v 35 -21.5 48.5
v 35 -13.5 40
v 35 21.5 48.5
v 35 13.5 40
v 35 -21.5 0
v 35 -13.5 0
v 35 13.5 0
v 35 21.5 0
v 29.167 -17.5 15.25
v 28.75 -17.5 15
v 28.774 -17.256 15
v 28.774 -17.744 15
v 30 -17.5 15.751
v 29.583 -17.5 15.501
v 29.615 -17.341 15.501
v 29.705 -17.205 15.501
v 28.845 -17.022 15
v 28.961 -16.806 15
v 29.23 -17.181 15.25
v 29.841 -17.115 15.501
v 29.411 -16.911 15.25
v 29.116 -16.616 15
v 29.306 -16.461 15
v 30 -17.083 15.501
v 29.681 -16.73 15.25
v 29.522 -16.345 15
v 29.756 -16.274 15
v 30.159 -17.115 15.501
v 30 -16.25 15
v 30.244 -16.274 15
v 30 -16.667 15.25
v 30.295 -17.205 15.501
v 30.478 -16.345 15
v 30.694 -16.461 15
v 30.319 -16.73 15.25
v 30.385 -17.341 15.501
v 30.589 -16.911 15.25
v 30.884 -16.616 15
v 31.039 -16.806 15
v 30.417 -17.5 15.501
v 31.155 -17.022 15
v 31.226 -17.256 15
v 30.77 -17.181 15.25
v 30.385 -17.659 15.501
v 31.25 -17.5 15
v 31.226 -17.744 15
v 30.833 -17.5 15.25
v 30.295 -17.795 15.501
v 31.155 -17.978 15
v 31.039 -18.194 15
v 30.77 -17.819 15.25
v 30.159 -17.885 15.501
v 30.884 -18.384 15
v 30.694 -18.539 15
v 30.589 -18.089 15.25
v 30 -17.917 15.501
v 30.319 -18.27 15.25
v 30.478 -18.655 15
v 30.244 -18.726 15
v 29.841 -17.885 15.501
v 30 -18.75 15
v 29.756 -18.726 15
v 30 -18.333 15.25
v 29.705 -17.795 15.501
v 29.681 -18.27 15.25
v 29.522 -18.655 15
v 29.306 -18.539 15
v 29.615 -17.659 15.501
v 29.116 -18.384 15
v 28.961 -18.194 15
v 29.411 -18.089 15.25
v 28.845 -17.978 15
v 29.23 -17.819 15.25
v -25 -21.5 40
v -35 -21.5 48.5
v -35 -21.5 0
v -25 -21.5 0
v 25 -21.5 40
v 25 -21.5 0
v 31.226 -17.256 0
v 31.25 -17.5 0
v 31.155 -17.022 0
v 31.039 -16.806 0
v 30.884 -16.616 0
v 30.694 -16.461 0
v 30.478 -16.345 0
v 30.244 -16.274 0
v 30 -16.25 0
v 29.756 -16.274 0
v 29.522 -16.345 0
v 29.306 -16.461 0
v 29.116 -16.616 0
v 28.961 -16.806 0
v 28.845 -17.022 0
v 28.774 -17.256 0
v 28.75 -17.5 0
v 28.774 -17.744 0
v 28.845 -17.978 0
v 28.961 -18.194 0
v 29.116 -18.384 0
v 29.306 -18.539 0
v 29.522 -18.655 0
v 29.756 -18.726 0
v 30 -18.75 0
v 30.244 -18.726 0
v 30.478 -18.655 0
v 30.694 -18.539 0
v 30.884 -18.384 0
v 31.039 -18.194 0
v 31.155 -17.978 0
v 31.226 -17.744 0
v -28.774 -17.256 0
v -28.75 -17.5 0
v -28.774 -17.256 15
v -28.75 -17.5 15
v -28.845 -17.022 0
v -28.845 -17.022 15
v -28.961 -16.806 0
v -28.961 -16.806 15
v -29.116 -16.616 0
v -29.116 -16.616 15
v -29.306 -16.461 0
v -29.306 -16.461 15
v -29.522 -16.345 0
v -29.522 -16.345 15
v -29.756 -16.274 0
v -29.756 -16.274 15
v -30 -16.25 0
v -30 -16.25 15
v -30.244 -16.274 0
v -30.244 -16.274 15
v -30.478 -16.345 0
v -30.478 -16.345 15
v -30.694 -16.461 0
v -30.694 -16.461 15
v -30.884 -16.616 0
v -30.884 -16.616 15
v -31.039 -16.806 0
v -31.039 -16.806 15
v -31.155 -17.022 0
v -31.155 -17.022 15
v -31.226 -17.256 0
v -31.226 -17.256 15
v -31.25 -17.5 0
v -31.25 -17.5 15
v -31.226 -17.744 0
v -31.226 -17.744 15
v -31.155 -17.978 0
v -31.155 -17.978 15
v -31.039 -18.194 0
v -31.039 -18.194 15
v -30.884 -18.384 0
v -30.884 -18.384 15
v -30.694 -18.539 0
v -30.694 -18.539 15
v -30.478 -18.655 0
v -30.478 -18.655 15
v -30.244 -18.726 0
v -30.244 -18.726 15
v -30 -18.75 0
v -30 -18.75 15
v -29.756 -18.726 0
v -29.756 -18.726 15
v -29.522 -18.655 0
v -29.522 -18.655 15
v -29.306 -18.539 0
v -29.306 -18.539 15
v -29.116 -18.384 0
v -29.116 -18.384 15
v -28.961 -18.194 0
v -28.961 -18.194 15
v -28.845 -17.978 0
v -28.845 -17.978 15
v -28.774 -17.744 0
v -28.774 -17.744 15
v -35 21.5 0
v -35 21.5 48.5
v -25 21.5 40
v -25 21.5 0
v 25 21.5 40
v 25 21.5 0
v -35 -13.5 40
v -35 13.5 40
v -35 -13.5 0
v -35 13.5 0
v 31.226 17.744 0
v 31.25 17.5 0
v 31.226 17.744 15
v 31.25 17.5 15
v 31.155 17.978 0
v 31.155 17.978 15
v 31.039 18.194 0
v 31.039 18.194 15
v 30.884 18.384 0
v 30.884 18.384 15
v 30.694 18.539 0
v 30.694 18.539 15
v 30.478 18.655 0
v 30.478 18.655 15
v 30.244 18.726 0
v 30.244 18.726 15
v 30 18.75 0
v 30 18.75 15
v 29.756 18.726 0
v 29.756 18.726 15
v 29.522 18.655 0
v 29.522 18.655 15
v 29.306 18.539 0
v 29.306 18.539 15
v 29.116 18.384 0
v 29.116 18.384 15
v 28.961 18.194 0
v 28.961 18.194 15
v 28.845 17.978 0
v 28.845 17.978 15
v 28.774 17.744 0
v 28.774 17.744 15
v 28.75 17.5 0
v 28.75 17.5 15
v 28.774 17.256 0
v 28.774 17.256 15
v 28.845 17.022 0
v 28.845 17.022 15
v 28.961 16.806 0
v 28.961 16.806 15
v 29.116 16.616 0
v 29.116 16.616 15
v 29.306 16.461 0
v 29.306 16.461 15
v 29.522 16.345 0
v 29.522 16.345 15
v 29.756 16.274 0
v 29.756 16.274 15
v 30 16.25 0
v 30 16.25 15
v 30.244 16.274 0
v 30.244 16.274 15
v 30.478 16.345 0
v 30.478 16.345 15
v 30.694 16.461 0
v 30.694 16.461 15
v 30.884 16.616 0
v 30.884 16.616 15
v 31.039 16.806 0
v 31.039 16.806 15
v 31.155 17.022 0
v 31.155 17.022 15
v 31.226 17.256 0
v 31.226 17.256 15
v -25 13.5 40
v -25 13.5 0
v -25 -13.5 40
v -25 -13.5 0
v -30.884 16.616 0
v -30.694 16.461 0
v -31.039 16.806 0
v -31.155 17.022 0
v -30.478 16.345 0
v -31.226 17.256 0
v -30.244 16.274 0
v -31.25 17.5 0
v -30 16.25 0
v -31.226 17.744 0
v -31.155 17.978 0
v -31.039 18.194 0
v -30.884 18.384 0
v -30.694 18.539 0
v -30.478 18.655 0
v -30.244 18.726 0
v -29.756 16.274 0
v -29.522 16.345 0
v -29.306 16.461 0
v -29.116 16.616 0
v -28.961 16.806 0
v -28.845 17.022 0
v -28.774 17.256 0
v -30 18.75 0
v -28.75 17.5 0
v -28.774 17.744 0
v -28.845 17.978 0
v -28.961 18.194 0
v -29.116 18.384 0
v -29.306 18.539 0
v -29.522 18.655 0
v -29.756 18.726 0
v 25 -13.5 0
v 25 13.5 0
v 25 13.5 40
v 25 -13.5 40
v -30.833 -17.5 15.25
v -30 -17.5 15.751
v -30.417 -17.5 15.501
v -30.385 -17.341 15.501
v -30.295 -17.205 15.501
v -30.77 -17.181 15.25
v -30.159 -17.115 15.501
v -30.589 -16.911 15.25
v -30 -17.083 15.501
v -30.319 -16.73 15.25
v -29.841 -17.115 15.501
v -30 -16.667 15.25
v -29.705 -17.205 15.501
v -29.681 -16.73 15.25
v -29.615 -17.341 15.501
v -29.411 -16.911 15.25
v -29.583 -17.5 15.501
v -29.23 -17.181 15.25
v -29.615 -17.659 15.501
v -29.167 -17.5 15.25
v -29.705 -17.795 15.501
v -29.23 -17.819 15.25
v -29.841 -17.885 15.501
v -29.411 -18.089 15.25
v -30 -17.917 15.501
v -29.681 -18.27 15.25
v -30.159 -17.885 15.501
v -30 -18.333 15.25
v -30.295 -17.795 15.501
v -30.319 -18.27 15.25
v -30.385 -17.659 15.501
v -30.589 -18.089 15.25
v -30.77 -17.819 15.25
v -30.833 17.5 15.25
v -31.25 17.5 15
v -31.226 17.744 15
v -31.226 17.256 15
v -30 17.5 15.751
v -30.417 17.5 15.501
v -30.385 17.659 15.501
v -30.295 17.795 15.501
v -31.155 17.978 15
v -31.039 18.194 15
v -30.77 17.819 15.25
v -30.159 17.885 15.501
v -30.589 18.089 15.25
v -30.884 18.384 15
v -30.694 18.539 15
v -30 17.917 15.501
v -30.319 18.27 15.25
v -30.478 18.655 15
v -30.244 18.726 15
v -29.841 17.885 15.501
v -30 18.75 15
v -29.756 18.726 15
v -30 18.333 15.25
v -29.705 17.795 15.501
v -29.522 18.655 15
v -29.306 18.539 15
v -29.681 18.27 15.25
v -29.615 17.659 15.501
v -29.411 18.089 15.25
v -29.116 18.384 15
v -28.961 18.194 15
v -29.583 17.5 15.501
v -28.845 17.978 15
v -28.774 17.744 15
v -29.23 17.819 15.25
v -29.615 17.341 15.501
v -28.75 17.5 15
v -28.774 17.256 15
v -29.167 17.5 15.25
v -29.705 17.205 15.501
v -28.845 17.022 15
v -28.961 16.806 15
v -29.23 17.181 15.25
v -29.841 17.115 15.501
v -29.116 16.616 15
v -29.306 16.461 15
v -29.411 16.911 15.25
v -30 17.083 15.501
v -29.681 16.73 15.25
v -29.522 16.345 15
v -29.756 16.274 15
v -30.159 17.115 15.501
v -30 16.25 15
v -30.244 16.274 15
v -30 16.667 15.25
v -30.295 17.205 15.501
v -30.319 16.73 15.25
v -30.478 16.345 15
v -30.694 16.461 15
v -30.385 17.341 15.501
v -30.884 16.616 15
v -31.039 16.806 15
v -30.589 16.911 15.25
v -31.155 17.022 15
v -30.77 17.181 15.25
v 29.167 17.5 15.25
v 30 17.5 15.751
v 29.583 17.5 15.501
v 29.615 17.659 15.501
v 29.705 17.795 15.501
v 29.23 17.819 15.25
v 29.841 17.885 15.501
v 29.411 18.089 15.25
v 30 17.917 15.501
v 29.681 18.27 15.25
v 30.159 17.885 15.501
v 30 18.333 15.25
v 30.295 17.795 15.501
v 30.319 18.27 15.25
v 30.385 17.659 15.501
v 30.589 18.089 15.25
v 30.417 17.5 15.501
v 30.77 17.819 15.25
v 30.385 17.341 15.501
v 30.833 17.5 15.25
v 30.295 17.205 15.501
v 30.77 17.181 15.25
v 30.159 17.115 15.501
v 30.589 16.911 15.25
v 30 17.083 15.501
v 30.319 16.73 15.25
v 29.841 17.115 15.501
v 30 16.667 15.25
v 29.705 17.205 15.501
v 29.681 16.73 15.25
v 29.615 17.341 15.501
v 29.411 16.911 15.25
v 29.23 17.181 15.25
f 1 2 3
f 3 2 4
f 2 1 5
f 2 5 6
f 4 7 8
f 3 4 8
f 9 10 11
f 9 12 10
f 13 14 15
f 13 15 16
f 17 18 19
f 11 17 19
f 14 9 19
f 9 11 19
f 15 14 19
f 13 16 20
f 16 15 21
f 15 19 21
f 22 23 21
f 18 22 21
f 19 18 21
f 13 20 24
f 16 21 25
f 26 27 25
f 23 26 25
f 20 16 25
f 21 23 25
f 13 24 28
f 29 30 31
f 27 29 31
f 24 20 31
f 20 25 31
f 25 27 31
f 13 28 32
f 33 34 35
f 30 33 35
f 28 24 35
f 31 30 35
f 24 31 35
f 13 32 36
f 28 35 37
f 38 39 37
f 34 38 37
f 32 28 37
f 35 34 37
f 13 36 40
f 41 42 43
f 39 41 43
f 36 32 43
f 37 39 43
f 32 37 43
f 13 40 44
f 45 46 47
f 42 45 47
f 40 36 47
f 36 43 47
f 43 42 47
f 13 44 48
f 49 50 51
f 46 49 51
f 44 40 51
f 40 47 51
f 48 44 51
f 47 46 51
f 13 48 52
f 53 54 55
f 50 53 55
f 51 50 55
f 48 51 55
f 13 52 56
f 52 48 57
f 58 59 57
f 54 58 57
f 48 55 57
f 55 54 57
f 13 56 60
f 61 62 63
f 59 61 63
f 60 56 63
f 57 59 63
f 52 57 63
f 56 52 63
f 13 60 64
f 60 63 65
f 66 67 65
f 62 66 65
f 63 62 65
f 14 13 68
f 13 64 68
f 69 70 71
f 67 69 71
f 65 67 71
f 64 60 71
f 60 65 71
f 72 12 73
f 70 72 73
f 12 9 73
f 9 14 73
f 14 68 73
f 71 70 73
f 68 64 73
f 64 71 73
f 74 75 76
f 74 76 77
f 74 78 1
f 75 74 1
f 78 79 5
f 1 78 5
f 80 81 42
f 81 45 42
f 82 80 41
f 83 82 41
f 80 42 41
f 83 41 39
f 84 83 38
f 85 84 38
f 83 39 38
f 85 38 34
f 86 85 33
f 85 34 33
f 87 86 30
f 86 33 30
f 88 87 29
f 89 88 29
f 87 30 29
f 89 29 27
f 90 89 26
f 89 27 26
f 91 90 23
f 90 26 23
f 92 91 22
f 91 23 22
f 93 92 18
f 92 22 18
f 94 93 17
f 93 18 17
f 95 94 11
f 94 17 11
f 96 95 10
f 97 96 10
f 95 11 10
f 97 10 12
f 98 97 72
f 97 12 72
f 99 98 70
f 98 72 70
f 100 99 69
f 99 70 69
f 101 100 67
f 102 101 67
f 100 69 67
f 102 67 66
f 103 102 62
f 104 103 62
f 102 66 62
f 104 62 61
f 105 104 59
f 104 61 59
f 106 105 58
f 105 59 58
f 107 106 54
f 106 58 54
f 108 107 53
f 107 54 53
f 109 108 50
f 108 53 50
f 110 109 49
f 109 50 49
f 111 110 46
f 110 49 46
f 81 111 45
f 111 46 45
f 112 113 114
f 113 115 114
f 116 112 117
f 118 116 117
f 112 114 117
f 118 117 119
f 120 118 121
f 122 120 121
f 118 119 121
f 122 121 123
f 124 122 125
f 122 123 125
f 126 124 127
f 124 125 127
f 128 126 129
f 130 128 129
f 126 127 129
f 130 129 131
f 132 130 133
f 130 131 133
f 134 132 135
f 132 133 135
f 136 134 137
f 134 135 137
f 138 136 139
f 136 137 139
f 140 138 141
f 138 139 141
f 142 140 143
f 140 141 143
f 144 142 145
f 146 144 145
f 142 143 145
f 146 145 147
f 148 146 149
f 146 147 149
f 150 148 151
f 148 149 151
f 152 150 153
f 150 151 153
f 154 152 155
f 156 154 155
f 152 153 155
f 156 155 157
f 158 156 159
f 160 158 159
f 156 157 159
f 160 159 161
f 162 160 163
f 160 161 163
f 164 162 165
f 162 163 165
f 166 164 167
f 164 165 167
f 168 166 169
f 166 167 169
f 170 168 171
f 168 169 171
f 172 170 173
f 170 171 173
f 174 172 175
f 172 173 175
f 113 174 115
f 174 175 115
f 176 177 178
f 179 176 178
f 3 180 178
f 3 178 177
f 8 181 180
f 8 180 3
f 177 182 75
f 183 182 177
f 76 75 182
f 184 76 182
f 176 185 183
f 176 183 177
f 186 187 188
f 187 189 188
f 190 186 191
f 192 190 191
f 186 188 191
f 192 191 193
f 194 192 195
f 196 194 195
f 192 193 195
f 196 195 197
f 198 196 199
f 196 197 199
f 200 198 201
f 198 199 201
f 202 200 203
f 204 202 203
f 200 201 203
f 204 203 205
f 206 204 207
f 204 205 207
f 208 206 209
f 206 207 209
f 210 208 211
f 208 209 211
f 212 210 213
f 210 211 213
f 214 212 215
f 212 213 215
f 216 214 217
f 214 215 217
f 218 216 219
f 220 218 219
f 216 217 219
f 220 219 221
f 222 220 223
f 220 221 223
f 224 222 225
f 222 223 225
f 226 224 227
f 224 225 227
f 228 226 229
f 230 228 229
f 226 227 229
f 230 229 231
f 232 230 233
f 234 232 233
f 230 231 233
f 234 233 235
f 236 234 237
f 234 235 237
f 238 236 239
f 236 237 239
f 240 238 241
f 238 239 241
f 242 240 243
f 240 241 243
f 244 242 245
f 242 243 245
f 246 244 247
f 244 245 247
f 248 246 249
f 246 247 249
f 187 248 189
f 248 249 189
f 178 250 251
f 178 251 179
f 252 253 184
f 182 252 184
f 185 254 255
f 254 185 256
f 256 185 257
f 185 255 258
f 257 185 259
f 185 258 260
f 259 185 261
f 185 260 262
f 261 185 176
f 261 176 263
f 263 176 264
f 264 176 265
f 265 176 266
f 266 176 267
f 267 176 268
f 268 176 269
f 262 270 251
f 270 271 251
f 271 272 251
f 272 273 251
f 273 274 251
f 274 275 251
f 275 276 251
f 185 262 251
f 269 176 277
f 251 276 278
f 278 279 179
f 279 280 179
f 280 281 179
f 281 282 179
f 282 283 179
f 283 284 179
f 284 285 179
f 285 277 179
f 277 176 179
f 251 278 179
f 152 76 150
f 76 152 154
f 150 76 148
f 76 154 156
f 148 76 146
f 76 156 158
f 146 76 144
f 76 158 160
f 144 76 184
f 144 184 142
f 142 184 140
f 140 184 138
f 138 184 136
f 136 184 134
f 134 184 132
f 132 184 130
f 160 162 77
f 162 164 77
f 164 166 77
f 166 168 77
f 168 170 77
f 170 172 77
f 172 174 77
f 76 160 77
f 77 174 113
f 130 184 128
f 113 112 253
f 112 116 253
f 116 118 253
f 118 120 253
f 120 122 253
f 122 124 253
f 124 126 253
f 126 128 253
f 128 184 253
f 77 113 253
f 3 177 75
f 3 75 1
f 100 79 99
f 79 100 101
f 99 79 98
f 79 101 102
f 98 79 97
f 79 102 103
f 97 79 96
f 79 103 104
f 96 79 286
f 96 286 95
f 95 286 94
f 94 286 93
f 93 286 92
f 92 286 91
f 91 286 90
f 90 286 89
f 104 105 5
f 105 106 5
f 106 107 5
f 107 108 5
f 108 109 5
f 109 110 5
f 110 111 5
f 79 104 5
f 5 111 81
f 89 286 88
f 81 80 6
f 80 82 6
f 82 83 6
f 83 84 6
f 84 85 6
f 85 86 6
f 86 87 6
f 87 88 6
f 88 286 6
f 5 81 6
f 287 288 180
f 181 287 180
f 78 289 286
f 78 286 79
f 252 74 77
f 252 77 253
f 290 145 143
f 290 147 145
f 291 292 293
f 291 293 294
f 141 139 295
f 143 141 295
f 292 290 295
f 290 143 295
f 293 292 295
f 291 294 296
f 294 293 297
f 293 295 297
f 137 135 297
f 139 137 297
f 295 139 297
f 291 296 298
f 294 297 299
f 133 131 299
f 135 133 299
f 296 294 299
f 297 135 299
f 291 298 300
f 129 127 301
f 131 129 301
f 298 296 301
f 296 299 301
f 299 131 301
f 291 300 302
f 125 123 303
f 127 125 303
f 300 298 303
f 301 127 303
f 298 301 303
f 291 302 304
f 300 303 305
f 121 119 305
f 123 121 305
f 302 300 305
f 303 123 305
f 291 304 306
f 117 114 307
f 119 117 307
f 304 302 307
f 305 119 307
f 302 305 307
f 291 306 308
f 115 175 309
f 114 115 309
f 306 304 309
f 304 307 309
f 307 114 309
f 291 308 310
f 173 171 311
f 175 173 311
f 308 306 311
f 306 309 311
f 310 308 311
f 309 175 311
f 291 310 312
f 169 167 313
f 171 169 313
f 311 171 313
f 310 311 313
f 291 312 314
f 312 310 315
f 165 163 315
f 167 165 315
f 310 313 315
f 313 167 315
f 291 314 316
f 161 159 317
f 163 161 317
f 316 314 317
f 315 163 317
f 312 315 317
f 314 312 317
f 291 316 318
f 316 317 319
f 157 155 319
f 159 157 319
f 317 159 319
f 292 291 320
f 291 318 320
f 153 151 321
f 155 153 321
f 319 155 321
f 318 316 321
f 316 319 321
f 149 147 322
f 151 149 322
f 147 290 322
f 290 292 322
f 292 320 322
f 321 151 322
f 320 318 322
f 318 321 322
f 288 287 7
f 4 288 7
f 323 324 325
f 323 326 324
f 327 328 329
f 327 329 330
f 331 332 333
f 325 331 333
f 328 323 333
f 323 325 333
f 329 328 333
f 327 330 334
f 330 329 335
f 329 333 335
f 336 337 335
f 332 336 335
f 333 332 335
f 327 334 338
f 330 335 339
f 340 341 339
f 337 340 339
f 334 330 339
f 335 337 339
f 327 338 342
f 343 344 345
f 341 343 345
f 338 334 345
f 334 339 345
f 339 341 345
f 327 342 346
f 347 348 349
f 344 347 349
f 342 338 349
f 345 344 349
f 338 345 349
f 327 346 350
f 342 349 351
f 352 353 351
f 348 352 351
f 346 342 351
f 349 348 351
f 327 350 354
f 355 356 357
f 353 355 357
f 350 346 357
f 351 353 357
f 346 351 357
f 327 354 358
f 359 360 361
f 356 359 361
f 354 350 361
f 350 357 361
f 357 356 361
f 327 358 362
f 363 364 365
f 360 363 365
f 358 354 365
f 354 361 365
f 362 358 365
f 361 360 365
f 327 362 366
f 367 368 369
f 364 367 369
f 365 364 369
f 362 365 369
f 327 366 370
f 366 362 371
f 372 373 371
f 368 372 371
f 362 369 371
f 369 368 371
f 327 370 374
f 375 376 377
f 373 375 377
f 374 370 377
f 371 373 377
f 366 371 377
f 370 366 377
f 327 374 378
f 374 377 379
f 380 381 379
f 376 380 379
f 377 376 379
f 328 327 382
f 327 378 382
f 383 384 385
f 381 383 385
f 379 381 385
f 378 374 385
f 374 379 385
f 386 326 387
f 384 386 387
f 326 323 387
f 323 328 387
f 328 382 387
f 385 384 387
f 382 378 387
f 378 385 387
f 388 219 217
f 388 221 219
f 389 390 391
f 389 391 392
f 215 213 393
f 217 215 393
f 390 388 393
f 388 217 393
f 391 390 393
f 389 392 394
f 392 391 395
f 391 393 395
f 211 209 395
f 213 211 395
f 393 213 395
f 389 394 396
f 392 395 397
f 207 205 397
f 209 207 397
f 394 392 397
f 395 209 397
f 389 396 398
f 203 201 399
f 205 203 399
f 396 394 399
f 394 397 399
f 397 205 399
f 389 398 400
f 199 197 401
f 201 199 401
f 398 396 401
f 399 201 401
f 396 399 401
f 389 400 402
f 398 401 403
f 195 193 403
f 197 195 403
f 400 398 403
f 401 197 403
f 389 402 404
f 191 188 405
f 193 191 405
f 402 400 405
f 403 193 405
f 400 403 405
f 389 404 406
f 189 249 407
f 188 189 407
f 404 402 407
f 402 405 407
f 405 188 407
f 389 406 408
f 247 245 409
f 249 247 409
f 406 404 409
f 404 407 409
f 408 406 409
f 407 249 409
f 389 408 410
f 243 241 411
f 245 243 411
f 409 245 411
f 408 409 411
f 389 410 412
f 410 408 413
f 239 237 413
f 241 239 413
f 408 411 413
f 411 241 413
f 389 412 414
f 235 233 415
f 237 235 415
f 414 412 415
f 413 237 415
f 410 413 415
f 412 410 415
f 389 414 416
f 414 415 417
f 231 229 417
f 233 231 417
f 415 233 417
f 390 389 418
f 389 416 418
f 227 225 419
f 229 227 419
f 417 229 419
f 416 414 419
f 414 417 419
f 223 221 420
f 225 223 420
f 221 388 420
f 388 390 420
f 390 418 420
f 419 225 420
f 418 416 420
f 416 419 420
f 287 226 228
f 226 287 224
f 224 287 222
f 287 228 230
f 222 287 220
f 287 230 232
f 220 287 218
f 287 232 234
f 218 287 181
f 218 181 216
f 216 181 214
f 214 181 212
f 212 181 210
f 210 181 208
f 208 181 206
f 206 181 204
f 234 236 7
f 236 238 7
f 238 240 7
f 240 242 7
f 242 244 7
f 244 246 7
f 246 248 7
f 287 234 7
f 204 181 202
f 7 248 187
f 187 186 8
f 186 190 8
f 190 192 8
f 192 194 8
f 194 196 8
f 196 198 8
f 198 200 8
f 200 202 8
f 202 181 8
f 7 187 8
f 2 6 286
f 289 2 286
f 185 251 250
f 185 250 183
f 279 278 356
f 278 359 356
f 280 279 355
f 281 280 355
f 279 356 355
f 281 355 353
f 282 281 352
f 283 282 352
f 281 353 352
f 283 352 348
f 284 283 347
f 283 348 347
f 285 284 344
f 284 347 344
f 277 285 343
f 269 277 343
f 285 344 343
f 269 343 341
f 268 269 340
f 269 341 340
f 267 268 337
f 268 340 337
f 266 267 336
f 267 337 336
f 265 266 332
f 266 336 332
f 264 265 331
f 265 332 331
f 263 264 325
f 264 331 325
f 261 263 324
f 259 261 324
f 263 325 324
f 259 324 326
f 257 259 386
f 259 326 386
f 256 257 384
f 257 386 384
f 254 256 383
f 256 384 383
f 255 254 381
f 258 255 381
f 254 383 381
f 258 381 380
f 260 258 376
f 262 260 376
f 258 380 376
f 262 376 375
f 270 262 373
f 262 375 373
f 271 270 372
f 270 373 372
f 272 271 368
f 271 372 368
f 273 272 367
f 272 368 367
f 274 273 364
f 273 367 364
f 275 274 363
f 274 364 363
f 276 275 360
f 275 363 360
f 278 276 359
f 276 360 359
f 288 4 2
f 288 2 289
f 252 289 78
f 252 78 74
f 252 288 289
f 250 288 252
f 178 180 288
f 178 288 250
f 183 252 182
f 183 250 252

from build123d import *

# Parameters (mm, degrees)
SKETCH_1_W             = 70
SKETCH_1_H             = 43
EXTRUDE_1_DEPTH        = 48.5
SKETCH_2_W             = 50
SKETCH_2_H             = 27
SKETCH_2_H_2           = 8
SKETCH_2_W_2           = 10
CUT_EXTRUDE_1_DEPTH    = 40
HOLE_WIZARD_M3_1_D     = 2.5
HOLE_WIZARD_M3_1_DEPTH = 15
HOLE_WIZARD_M3_1_TIP   = 0.751075774


with BuildPart() as part:
    # 草图1 → 凸台-拉伸1 (new body)
    with BuildSketch(Plane.XY):
        Rectangle(SKETCH_1_W, SKETCH_1_H)
    extrude(amount=EXTRUDE_1_DEPTH)

    # 草图2 → 切除-拉伸1 (cut)
    with BuildSketch(Plane(origin=(0, 0, 0), x_dir=(-1, 0, 0), z_dir=(0, 0, -1))):
        Rectangle(SKETCH_2_W, SKETCH_2_H)
        with Locations((0, -17.5)):
            Rectangle(SKETCH_2_W, SKETCH_2_H_2)
        with Locations((-30, 0)):
            Rectangle(SKETCH_2_W_2, SKETCH_2_H)
        with Locations((0, 17.5)):
            Rectangle(SKETCH_2_W, SKETCH_2_H_2)
        with Locations((30, 0)):
            Rectangle(SKETCH_2_W_2, SKETCH_2_H)
    extrude(amount=-CUT_EXTRUDE_1_DEPTH, mode=Mode.SUBTRACT)

    # M3 螺纹孔1
    with Locations(Plane(origin=(0, 0, 0), x_dir=(-1, 0, 0), z_dir=(0, 0, -1))):
        with Locations((-30, 17.5), (30, 17.5), (30, -17.5), (-30, -17.5)):
            Hole(HOLE_WIZARD_M3_1_D / 2, depth=HOLE_WIZARD_M3_1_DEPTH)
            with Locations((0, 0, -(HOLE_WIZARD_M3_1_DEPTH + HOLE_WIZARD_M3_1_TIP / 2))):  # 118° drill point
                Cone(0, HOLE_WIZARD_M3_1_D / 2, HOLE_WIZARD_M3_1_TIP, mode=Mode.SUBTRACT)


solid = part.part
